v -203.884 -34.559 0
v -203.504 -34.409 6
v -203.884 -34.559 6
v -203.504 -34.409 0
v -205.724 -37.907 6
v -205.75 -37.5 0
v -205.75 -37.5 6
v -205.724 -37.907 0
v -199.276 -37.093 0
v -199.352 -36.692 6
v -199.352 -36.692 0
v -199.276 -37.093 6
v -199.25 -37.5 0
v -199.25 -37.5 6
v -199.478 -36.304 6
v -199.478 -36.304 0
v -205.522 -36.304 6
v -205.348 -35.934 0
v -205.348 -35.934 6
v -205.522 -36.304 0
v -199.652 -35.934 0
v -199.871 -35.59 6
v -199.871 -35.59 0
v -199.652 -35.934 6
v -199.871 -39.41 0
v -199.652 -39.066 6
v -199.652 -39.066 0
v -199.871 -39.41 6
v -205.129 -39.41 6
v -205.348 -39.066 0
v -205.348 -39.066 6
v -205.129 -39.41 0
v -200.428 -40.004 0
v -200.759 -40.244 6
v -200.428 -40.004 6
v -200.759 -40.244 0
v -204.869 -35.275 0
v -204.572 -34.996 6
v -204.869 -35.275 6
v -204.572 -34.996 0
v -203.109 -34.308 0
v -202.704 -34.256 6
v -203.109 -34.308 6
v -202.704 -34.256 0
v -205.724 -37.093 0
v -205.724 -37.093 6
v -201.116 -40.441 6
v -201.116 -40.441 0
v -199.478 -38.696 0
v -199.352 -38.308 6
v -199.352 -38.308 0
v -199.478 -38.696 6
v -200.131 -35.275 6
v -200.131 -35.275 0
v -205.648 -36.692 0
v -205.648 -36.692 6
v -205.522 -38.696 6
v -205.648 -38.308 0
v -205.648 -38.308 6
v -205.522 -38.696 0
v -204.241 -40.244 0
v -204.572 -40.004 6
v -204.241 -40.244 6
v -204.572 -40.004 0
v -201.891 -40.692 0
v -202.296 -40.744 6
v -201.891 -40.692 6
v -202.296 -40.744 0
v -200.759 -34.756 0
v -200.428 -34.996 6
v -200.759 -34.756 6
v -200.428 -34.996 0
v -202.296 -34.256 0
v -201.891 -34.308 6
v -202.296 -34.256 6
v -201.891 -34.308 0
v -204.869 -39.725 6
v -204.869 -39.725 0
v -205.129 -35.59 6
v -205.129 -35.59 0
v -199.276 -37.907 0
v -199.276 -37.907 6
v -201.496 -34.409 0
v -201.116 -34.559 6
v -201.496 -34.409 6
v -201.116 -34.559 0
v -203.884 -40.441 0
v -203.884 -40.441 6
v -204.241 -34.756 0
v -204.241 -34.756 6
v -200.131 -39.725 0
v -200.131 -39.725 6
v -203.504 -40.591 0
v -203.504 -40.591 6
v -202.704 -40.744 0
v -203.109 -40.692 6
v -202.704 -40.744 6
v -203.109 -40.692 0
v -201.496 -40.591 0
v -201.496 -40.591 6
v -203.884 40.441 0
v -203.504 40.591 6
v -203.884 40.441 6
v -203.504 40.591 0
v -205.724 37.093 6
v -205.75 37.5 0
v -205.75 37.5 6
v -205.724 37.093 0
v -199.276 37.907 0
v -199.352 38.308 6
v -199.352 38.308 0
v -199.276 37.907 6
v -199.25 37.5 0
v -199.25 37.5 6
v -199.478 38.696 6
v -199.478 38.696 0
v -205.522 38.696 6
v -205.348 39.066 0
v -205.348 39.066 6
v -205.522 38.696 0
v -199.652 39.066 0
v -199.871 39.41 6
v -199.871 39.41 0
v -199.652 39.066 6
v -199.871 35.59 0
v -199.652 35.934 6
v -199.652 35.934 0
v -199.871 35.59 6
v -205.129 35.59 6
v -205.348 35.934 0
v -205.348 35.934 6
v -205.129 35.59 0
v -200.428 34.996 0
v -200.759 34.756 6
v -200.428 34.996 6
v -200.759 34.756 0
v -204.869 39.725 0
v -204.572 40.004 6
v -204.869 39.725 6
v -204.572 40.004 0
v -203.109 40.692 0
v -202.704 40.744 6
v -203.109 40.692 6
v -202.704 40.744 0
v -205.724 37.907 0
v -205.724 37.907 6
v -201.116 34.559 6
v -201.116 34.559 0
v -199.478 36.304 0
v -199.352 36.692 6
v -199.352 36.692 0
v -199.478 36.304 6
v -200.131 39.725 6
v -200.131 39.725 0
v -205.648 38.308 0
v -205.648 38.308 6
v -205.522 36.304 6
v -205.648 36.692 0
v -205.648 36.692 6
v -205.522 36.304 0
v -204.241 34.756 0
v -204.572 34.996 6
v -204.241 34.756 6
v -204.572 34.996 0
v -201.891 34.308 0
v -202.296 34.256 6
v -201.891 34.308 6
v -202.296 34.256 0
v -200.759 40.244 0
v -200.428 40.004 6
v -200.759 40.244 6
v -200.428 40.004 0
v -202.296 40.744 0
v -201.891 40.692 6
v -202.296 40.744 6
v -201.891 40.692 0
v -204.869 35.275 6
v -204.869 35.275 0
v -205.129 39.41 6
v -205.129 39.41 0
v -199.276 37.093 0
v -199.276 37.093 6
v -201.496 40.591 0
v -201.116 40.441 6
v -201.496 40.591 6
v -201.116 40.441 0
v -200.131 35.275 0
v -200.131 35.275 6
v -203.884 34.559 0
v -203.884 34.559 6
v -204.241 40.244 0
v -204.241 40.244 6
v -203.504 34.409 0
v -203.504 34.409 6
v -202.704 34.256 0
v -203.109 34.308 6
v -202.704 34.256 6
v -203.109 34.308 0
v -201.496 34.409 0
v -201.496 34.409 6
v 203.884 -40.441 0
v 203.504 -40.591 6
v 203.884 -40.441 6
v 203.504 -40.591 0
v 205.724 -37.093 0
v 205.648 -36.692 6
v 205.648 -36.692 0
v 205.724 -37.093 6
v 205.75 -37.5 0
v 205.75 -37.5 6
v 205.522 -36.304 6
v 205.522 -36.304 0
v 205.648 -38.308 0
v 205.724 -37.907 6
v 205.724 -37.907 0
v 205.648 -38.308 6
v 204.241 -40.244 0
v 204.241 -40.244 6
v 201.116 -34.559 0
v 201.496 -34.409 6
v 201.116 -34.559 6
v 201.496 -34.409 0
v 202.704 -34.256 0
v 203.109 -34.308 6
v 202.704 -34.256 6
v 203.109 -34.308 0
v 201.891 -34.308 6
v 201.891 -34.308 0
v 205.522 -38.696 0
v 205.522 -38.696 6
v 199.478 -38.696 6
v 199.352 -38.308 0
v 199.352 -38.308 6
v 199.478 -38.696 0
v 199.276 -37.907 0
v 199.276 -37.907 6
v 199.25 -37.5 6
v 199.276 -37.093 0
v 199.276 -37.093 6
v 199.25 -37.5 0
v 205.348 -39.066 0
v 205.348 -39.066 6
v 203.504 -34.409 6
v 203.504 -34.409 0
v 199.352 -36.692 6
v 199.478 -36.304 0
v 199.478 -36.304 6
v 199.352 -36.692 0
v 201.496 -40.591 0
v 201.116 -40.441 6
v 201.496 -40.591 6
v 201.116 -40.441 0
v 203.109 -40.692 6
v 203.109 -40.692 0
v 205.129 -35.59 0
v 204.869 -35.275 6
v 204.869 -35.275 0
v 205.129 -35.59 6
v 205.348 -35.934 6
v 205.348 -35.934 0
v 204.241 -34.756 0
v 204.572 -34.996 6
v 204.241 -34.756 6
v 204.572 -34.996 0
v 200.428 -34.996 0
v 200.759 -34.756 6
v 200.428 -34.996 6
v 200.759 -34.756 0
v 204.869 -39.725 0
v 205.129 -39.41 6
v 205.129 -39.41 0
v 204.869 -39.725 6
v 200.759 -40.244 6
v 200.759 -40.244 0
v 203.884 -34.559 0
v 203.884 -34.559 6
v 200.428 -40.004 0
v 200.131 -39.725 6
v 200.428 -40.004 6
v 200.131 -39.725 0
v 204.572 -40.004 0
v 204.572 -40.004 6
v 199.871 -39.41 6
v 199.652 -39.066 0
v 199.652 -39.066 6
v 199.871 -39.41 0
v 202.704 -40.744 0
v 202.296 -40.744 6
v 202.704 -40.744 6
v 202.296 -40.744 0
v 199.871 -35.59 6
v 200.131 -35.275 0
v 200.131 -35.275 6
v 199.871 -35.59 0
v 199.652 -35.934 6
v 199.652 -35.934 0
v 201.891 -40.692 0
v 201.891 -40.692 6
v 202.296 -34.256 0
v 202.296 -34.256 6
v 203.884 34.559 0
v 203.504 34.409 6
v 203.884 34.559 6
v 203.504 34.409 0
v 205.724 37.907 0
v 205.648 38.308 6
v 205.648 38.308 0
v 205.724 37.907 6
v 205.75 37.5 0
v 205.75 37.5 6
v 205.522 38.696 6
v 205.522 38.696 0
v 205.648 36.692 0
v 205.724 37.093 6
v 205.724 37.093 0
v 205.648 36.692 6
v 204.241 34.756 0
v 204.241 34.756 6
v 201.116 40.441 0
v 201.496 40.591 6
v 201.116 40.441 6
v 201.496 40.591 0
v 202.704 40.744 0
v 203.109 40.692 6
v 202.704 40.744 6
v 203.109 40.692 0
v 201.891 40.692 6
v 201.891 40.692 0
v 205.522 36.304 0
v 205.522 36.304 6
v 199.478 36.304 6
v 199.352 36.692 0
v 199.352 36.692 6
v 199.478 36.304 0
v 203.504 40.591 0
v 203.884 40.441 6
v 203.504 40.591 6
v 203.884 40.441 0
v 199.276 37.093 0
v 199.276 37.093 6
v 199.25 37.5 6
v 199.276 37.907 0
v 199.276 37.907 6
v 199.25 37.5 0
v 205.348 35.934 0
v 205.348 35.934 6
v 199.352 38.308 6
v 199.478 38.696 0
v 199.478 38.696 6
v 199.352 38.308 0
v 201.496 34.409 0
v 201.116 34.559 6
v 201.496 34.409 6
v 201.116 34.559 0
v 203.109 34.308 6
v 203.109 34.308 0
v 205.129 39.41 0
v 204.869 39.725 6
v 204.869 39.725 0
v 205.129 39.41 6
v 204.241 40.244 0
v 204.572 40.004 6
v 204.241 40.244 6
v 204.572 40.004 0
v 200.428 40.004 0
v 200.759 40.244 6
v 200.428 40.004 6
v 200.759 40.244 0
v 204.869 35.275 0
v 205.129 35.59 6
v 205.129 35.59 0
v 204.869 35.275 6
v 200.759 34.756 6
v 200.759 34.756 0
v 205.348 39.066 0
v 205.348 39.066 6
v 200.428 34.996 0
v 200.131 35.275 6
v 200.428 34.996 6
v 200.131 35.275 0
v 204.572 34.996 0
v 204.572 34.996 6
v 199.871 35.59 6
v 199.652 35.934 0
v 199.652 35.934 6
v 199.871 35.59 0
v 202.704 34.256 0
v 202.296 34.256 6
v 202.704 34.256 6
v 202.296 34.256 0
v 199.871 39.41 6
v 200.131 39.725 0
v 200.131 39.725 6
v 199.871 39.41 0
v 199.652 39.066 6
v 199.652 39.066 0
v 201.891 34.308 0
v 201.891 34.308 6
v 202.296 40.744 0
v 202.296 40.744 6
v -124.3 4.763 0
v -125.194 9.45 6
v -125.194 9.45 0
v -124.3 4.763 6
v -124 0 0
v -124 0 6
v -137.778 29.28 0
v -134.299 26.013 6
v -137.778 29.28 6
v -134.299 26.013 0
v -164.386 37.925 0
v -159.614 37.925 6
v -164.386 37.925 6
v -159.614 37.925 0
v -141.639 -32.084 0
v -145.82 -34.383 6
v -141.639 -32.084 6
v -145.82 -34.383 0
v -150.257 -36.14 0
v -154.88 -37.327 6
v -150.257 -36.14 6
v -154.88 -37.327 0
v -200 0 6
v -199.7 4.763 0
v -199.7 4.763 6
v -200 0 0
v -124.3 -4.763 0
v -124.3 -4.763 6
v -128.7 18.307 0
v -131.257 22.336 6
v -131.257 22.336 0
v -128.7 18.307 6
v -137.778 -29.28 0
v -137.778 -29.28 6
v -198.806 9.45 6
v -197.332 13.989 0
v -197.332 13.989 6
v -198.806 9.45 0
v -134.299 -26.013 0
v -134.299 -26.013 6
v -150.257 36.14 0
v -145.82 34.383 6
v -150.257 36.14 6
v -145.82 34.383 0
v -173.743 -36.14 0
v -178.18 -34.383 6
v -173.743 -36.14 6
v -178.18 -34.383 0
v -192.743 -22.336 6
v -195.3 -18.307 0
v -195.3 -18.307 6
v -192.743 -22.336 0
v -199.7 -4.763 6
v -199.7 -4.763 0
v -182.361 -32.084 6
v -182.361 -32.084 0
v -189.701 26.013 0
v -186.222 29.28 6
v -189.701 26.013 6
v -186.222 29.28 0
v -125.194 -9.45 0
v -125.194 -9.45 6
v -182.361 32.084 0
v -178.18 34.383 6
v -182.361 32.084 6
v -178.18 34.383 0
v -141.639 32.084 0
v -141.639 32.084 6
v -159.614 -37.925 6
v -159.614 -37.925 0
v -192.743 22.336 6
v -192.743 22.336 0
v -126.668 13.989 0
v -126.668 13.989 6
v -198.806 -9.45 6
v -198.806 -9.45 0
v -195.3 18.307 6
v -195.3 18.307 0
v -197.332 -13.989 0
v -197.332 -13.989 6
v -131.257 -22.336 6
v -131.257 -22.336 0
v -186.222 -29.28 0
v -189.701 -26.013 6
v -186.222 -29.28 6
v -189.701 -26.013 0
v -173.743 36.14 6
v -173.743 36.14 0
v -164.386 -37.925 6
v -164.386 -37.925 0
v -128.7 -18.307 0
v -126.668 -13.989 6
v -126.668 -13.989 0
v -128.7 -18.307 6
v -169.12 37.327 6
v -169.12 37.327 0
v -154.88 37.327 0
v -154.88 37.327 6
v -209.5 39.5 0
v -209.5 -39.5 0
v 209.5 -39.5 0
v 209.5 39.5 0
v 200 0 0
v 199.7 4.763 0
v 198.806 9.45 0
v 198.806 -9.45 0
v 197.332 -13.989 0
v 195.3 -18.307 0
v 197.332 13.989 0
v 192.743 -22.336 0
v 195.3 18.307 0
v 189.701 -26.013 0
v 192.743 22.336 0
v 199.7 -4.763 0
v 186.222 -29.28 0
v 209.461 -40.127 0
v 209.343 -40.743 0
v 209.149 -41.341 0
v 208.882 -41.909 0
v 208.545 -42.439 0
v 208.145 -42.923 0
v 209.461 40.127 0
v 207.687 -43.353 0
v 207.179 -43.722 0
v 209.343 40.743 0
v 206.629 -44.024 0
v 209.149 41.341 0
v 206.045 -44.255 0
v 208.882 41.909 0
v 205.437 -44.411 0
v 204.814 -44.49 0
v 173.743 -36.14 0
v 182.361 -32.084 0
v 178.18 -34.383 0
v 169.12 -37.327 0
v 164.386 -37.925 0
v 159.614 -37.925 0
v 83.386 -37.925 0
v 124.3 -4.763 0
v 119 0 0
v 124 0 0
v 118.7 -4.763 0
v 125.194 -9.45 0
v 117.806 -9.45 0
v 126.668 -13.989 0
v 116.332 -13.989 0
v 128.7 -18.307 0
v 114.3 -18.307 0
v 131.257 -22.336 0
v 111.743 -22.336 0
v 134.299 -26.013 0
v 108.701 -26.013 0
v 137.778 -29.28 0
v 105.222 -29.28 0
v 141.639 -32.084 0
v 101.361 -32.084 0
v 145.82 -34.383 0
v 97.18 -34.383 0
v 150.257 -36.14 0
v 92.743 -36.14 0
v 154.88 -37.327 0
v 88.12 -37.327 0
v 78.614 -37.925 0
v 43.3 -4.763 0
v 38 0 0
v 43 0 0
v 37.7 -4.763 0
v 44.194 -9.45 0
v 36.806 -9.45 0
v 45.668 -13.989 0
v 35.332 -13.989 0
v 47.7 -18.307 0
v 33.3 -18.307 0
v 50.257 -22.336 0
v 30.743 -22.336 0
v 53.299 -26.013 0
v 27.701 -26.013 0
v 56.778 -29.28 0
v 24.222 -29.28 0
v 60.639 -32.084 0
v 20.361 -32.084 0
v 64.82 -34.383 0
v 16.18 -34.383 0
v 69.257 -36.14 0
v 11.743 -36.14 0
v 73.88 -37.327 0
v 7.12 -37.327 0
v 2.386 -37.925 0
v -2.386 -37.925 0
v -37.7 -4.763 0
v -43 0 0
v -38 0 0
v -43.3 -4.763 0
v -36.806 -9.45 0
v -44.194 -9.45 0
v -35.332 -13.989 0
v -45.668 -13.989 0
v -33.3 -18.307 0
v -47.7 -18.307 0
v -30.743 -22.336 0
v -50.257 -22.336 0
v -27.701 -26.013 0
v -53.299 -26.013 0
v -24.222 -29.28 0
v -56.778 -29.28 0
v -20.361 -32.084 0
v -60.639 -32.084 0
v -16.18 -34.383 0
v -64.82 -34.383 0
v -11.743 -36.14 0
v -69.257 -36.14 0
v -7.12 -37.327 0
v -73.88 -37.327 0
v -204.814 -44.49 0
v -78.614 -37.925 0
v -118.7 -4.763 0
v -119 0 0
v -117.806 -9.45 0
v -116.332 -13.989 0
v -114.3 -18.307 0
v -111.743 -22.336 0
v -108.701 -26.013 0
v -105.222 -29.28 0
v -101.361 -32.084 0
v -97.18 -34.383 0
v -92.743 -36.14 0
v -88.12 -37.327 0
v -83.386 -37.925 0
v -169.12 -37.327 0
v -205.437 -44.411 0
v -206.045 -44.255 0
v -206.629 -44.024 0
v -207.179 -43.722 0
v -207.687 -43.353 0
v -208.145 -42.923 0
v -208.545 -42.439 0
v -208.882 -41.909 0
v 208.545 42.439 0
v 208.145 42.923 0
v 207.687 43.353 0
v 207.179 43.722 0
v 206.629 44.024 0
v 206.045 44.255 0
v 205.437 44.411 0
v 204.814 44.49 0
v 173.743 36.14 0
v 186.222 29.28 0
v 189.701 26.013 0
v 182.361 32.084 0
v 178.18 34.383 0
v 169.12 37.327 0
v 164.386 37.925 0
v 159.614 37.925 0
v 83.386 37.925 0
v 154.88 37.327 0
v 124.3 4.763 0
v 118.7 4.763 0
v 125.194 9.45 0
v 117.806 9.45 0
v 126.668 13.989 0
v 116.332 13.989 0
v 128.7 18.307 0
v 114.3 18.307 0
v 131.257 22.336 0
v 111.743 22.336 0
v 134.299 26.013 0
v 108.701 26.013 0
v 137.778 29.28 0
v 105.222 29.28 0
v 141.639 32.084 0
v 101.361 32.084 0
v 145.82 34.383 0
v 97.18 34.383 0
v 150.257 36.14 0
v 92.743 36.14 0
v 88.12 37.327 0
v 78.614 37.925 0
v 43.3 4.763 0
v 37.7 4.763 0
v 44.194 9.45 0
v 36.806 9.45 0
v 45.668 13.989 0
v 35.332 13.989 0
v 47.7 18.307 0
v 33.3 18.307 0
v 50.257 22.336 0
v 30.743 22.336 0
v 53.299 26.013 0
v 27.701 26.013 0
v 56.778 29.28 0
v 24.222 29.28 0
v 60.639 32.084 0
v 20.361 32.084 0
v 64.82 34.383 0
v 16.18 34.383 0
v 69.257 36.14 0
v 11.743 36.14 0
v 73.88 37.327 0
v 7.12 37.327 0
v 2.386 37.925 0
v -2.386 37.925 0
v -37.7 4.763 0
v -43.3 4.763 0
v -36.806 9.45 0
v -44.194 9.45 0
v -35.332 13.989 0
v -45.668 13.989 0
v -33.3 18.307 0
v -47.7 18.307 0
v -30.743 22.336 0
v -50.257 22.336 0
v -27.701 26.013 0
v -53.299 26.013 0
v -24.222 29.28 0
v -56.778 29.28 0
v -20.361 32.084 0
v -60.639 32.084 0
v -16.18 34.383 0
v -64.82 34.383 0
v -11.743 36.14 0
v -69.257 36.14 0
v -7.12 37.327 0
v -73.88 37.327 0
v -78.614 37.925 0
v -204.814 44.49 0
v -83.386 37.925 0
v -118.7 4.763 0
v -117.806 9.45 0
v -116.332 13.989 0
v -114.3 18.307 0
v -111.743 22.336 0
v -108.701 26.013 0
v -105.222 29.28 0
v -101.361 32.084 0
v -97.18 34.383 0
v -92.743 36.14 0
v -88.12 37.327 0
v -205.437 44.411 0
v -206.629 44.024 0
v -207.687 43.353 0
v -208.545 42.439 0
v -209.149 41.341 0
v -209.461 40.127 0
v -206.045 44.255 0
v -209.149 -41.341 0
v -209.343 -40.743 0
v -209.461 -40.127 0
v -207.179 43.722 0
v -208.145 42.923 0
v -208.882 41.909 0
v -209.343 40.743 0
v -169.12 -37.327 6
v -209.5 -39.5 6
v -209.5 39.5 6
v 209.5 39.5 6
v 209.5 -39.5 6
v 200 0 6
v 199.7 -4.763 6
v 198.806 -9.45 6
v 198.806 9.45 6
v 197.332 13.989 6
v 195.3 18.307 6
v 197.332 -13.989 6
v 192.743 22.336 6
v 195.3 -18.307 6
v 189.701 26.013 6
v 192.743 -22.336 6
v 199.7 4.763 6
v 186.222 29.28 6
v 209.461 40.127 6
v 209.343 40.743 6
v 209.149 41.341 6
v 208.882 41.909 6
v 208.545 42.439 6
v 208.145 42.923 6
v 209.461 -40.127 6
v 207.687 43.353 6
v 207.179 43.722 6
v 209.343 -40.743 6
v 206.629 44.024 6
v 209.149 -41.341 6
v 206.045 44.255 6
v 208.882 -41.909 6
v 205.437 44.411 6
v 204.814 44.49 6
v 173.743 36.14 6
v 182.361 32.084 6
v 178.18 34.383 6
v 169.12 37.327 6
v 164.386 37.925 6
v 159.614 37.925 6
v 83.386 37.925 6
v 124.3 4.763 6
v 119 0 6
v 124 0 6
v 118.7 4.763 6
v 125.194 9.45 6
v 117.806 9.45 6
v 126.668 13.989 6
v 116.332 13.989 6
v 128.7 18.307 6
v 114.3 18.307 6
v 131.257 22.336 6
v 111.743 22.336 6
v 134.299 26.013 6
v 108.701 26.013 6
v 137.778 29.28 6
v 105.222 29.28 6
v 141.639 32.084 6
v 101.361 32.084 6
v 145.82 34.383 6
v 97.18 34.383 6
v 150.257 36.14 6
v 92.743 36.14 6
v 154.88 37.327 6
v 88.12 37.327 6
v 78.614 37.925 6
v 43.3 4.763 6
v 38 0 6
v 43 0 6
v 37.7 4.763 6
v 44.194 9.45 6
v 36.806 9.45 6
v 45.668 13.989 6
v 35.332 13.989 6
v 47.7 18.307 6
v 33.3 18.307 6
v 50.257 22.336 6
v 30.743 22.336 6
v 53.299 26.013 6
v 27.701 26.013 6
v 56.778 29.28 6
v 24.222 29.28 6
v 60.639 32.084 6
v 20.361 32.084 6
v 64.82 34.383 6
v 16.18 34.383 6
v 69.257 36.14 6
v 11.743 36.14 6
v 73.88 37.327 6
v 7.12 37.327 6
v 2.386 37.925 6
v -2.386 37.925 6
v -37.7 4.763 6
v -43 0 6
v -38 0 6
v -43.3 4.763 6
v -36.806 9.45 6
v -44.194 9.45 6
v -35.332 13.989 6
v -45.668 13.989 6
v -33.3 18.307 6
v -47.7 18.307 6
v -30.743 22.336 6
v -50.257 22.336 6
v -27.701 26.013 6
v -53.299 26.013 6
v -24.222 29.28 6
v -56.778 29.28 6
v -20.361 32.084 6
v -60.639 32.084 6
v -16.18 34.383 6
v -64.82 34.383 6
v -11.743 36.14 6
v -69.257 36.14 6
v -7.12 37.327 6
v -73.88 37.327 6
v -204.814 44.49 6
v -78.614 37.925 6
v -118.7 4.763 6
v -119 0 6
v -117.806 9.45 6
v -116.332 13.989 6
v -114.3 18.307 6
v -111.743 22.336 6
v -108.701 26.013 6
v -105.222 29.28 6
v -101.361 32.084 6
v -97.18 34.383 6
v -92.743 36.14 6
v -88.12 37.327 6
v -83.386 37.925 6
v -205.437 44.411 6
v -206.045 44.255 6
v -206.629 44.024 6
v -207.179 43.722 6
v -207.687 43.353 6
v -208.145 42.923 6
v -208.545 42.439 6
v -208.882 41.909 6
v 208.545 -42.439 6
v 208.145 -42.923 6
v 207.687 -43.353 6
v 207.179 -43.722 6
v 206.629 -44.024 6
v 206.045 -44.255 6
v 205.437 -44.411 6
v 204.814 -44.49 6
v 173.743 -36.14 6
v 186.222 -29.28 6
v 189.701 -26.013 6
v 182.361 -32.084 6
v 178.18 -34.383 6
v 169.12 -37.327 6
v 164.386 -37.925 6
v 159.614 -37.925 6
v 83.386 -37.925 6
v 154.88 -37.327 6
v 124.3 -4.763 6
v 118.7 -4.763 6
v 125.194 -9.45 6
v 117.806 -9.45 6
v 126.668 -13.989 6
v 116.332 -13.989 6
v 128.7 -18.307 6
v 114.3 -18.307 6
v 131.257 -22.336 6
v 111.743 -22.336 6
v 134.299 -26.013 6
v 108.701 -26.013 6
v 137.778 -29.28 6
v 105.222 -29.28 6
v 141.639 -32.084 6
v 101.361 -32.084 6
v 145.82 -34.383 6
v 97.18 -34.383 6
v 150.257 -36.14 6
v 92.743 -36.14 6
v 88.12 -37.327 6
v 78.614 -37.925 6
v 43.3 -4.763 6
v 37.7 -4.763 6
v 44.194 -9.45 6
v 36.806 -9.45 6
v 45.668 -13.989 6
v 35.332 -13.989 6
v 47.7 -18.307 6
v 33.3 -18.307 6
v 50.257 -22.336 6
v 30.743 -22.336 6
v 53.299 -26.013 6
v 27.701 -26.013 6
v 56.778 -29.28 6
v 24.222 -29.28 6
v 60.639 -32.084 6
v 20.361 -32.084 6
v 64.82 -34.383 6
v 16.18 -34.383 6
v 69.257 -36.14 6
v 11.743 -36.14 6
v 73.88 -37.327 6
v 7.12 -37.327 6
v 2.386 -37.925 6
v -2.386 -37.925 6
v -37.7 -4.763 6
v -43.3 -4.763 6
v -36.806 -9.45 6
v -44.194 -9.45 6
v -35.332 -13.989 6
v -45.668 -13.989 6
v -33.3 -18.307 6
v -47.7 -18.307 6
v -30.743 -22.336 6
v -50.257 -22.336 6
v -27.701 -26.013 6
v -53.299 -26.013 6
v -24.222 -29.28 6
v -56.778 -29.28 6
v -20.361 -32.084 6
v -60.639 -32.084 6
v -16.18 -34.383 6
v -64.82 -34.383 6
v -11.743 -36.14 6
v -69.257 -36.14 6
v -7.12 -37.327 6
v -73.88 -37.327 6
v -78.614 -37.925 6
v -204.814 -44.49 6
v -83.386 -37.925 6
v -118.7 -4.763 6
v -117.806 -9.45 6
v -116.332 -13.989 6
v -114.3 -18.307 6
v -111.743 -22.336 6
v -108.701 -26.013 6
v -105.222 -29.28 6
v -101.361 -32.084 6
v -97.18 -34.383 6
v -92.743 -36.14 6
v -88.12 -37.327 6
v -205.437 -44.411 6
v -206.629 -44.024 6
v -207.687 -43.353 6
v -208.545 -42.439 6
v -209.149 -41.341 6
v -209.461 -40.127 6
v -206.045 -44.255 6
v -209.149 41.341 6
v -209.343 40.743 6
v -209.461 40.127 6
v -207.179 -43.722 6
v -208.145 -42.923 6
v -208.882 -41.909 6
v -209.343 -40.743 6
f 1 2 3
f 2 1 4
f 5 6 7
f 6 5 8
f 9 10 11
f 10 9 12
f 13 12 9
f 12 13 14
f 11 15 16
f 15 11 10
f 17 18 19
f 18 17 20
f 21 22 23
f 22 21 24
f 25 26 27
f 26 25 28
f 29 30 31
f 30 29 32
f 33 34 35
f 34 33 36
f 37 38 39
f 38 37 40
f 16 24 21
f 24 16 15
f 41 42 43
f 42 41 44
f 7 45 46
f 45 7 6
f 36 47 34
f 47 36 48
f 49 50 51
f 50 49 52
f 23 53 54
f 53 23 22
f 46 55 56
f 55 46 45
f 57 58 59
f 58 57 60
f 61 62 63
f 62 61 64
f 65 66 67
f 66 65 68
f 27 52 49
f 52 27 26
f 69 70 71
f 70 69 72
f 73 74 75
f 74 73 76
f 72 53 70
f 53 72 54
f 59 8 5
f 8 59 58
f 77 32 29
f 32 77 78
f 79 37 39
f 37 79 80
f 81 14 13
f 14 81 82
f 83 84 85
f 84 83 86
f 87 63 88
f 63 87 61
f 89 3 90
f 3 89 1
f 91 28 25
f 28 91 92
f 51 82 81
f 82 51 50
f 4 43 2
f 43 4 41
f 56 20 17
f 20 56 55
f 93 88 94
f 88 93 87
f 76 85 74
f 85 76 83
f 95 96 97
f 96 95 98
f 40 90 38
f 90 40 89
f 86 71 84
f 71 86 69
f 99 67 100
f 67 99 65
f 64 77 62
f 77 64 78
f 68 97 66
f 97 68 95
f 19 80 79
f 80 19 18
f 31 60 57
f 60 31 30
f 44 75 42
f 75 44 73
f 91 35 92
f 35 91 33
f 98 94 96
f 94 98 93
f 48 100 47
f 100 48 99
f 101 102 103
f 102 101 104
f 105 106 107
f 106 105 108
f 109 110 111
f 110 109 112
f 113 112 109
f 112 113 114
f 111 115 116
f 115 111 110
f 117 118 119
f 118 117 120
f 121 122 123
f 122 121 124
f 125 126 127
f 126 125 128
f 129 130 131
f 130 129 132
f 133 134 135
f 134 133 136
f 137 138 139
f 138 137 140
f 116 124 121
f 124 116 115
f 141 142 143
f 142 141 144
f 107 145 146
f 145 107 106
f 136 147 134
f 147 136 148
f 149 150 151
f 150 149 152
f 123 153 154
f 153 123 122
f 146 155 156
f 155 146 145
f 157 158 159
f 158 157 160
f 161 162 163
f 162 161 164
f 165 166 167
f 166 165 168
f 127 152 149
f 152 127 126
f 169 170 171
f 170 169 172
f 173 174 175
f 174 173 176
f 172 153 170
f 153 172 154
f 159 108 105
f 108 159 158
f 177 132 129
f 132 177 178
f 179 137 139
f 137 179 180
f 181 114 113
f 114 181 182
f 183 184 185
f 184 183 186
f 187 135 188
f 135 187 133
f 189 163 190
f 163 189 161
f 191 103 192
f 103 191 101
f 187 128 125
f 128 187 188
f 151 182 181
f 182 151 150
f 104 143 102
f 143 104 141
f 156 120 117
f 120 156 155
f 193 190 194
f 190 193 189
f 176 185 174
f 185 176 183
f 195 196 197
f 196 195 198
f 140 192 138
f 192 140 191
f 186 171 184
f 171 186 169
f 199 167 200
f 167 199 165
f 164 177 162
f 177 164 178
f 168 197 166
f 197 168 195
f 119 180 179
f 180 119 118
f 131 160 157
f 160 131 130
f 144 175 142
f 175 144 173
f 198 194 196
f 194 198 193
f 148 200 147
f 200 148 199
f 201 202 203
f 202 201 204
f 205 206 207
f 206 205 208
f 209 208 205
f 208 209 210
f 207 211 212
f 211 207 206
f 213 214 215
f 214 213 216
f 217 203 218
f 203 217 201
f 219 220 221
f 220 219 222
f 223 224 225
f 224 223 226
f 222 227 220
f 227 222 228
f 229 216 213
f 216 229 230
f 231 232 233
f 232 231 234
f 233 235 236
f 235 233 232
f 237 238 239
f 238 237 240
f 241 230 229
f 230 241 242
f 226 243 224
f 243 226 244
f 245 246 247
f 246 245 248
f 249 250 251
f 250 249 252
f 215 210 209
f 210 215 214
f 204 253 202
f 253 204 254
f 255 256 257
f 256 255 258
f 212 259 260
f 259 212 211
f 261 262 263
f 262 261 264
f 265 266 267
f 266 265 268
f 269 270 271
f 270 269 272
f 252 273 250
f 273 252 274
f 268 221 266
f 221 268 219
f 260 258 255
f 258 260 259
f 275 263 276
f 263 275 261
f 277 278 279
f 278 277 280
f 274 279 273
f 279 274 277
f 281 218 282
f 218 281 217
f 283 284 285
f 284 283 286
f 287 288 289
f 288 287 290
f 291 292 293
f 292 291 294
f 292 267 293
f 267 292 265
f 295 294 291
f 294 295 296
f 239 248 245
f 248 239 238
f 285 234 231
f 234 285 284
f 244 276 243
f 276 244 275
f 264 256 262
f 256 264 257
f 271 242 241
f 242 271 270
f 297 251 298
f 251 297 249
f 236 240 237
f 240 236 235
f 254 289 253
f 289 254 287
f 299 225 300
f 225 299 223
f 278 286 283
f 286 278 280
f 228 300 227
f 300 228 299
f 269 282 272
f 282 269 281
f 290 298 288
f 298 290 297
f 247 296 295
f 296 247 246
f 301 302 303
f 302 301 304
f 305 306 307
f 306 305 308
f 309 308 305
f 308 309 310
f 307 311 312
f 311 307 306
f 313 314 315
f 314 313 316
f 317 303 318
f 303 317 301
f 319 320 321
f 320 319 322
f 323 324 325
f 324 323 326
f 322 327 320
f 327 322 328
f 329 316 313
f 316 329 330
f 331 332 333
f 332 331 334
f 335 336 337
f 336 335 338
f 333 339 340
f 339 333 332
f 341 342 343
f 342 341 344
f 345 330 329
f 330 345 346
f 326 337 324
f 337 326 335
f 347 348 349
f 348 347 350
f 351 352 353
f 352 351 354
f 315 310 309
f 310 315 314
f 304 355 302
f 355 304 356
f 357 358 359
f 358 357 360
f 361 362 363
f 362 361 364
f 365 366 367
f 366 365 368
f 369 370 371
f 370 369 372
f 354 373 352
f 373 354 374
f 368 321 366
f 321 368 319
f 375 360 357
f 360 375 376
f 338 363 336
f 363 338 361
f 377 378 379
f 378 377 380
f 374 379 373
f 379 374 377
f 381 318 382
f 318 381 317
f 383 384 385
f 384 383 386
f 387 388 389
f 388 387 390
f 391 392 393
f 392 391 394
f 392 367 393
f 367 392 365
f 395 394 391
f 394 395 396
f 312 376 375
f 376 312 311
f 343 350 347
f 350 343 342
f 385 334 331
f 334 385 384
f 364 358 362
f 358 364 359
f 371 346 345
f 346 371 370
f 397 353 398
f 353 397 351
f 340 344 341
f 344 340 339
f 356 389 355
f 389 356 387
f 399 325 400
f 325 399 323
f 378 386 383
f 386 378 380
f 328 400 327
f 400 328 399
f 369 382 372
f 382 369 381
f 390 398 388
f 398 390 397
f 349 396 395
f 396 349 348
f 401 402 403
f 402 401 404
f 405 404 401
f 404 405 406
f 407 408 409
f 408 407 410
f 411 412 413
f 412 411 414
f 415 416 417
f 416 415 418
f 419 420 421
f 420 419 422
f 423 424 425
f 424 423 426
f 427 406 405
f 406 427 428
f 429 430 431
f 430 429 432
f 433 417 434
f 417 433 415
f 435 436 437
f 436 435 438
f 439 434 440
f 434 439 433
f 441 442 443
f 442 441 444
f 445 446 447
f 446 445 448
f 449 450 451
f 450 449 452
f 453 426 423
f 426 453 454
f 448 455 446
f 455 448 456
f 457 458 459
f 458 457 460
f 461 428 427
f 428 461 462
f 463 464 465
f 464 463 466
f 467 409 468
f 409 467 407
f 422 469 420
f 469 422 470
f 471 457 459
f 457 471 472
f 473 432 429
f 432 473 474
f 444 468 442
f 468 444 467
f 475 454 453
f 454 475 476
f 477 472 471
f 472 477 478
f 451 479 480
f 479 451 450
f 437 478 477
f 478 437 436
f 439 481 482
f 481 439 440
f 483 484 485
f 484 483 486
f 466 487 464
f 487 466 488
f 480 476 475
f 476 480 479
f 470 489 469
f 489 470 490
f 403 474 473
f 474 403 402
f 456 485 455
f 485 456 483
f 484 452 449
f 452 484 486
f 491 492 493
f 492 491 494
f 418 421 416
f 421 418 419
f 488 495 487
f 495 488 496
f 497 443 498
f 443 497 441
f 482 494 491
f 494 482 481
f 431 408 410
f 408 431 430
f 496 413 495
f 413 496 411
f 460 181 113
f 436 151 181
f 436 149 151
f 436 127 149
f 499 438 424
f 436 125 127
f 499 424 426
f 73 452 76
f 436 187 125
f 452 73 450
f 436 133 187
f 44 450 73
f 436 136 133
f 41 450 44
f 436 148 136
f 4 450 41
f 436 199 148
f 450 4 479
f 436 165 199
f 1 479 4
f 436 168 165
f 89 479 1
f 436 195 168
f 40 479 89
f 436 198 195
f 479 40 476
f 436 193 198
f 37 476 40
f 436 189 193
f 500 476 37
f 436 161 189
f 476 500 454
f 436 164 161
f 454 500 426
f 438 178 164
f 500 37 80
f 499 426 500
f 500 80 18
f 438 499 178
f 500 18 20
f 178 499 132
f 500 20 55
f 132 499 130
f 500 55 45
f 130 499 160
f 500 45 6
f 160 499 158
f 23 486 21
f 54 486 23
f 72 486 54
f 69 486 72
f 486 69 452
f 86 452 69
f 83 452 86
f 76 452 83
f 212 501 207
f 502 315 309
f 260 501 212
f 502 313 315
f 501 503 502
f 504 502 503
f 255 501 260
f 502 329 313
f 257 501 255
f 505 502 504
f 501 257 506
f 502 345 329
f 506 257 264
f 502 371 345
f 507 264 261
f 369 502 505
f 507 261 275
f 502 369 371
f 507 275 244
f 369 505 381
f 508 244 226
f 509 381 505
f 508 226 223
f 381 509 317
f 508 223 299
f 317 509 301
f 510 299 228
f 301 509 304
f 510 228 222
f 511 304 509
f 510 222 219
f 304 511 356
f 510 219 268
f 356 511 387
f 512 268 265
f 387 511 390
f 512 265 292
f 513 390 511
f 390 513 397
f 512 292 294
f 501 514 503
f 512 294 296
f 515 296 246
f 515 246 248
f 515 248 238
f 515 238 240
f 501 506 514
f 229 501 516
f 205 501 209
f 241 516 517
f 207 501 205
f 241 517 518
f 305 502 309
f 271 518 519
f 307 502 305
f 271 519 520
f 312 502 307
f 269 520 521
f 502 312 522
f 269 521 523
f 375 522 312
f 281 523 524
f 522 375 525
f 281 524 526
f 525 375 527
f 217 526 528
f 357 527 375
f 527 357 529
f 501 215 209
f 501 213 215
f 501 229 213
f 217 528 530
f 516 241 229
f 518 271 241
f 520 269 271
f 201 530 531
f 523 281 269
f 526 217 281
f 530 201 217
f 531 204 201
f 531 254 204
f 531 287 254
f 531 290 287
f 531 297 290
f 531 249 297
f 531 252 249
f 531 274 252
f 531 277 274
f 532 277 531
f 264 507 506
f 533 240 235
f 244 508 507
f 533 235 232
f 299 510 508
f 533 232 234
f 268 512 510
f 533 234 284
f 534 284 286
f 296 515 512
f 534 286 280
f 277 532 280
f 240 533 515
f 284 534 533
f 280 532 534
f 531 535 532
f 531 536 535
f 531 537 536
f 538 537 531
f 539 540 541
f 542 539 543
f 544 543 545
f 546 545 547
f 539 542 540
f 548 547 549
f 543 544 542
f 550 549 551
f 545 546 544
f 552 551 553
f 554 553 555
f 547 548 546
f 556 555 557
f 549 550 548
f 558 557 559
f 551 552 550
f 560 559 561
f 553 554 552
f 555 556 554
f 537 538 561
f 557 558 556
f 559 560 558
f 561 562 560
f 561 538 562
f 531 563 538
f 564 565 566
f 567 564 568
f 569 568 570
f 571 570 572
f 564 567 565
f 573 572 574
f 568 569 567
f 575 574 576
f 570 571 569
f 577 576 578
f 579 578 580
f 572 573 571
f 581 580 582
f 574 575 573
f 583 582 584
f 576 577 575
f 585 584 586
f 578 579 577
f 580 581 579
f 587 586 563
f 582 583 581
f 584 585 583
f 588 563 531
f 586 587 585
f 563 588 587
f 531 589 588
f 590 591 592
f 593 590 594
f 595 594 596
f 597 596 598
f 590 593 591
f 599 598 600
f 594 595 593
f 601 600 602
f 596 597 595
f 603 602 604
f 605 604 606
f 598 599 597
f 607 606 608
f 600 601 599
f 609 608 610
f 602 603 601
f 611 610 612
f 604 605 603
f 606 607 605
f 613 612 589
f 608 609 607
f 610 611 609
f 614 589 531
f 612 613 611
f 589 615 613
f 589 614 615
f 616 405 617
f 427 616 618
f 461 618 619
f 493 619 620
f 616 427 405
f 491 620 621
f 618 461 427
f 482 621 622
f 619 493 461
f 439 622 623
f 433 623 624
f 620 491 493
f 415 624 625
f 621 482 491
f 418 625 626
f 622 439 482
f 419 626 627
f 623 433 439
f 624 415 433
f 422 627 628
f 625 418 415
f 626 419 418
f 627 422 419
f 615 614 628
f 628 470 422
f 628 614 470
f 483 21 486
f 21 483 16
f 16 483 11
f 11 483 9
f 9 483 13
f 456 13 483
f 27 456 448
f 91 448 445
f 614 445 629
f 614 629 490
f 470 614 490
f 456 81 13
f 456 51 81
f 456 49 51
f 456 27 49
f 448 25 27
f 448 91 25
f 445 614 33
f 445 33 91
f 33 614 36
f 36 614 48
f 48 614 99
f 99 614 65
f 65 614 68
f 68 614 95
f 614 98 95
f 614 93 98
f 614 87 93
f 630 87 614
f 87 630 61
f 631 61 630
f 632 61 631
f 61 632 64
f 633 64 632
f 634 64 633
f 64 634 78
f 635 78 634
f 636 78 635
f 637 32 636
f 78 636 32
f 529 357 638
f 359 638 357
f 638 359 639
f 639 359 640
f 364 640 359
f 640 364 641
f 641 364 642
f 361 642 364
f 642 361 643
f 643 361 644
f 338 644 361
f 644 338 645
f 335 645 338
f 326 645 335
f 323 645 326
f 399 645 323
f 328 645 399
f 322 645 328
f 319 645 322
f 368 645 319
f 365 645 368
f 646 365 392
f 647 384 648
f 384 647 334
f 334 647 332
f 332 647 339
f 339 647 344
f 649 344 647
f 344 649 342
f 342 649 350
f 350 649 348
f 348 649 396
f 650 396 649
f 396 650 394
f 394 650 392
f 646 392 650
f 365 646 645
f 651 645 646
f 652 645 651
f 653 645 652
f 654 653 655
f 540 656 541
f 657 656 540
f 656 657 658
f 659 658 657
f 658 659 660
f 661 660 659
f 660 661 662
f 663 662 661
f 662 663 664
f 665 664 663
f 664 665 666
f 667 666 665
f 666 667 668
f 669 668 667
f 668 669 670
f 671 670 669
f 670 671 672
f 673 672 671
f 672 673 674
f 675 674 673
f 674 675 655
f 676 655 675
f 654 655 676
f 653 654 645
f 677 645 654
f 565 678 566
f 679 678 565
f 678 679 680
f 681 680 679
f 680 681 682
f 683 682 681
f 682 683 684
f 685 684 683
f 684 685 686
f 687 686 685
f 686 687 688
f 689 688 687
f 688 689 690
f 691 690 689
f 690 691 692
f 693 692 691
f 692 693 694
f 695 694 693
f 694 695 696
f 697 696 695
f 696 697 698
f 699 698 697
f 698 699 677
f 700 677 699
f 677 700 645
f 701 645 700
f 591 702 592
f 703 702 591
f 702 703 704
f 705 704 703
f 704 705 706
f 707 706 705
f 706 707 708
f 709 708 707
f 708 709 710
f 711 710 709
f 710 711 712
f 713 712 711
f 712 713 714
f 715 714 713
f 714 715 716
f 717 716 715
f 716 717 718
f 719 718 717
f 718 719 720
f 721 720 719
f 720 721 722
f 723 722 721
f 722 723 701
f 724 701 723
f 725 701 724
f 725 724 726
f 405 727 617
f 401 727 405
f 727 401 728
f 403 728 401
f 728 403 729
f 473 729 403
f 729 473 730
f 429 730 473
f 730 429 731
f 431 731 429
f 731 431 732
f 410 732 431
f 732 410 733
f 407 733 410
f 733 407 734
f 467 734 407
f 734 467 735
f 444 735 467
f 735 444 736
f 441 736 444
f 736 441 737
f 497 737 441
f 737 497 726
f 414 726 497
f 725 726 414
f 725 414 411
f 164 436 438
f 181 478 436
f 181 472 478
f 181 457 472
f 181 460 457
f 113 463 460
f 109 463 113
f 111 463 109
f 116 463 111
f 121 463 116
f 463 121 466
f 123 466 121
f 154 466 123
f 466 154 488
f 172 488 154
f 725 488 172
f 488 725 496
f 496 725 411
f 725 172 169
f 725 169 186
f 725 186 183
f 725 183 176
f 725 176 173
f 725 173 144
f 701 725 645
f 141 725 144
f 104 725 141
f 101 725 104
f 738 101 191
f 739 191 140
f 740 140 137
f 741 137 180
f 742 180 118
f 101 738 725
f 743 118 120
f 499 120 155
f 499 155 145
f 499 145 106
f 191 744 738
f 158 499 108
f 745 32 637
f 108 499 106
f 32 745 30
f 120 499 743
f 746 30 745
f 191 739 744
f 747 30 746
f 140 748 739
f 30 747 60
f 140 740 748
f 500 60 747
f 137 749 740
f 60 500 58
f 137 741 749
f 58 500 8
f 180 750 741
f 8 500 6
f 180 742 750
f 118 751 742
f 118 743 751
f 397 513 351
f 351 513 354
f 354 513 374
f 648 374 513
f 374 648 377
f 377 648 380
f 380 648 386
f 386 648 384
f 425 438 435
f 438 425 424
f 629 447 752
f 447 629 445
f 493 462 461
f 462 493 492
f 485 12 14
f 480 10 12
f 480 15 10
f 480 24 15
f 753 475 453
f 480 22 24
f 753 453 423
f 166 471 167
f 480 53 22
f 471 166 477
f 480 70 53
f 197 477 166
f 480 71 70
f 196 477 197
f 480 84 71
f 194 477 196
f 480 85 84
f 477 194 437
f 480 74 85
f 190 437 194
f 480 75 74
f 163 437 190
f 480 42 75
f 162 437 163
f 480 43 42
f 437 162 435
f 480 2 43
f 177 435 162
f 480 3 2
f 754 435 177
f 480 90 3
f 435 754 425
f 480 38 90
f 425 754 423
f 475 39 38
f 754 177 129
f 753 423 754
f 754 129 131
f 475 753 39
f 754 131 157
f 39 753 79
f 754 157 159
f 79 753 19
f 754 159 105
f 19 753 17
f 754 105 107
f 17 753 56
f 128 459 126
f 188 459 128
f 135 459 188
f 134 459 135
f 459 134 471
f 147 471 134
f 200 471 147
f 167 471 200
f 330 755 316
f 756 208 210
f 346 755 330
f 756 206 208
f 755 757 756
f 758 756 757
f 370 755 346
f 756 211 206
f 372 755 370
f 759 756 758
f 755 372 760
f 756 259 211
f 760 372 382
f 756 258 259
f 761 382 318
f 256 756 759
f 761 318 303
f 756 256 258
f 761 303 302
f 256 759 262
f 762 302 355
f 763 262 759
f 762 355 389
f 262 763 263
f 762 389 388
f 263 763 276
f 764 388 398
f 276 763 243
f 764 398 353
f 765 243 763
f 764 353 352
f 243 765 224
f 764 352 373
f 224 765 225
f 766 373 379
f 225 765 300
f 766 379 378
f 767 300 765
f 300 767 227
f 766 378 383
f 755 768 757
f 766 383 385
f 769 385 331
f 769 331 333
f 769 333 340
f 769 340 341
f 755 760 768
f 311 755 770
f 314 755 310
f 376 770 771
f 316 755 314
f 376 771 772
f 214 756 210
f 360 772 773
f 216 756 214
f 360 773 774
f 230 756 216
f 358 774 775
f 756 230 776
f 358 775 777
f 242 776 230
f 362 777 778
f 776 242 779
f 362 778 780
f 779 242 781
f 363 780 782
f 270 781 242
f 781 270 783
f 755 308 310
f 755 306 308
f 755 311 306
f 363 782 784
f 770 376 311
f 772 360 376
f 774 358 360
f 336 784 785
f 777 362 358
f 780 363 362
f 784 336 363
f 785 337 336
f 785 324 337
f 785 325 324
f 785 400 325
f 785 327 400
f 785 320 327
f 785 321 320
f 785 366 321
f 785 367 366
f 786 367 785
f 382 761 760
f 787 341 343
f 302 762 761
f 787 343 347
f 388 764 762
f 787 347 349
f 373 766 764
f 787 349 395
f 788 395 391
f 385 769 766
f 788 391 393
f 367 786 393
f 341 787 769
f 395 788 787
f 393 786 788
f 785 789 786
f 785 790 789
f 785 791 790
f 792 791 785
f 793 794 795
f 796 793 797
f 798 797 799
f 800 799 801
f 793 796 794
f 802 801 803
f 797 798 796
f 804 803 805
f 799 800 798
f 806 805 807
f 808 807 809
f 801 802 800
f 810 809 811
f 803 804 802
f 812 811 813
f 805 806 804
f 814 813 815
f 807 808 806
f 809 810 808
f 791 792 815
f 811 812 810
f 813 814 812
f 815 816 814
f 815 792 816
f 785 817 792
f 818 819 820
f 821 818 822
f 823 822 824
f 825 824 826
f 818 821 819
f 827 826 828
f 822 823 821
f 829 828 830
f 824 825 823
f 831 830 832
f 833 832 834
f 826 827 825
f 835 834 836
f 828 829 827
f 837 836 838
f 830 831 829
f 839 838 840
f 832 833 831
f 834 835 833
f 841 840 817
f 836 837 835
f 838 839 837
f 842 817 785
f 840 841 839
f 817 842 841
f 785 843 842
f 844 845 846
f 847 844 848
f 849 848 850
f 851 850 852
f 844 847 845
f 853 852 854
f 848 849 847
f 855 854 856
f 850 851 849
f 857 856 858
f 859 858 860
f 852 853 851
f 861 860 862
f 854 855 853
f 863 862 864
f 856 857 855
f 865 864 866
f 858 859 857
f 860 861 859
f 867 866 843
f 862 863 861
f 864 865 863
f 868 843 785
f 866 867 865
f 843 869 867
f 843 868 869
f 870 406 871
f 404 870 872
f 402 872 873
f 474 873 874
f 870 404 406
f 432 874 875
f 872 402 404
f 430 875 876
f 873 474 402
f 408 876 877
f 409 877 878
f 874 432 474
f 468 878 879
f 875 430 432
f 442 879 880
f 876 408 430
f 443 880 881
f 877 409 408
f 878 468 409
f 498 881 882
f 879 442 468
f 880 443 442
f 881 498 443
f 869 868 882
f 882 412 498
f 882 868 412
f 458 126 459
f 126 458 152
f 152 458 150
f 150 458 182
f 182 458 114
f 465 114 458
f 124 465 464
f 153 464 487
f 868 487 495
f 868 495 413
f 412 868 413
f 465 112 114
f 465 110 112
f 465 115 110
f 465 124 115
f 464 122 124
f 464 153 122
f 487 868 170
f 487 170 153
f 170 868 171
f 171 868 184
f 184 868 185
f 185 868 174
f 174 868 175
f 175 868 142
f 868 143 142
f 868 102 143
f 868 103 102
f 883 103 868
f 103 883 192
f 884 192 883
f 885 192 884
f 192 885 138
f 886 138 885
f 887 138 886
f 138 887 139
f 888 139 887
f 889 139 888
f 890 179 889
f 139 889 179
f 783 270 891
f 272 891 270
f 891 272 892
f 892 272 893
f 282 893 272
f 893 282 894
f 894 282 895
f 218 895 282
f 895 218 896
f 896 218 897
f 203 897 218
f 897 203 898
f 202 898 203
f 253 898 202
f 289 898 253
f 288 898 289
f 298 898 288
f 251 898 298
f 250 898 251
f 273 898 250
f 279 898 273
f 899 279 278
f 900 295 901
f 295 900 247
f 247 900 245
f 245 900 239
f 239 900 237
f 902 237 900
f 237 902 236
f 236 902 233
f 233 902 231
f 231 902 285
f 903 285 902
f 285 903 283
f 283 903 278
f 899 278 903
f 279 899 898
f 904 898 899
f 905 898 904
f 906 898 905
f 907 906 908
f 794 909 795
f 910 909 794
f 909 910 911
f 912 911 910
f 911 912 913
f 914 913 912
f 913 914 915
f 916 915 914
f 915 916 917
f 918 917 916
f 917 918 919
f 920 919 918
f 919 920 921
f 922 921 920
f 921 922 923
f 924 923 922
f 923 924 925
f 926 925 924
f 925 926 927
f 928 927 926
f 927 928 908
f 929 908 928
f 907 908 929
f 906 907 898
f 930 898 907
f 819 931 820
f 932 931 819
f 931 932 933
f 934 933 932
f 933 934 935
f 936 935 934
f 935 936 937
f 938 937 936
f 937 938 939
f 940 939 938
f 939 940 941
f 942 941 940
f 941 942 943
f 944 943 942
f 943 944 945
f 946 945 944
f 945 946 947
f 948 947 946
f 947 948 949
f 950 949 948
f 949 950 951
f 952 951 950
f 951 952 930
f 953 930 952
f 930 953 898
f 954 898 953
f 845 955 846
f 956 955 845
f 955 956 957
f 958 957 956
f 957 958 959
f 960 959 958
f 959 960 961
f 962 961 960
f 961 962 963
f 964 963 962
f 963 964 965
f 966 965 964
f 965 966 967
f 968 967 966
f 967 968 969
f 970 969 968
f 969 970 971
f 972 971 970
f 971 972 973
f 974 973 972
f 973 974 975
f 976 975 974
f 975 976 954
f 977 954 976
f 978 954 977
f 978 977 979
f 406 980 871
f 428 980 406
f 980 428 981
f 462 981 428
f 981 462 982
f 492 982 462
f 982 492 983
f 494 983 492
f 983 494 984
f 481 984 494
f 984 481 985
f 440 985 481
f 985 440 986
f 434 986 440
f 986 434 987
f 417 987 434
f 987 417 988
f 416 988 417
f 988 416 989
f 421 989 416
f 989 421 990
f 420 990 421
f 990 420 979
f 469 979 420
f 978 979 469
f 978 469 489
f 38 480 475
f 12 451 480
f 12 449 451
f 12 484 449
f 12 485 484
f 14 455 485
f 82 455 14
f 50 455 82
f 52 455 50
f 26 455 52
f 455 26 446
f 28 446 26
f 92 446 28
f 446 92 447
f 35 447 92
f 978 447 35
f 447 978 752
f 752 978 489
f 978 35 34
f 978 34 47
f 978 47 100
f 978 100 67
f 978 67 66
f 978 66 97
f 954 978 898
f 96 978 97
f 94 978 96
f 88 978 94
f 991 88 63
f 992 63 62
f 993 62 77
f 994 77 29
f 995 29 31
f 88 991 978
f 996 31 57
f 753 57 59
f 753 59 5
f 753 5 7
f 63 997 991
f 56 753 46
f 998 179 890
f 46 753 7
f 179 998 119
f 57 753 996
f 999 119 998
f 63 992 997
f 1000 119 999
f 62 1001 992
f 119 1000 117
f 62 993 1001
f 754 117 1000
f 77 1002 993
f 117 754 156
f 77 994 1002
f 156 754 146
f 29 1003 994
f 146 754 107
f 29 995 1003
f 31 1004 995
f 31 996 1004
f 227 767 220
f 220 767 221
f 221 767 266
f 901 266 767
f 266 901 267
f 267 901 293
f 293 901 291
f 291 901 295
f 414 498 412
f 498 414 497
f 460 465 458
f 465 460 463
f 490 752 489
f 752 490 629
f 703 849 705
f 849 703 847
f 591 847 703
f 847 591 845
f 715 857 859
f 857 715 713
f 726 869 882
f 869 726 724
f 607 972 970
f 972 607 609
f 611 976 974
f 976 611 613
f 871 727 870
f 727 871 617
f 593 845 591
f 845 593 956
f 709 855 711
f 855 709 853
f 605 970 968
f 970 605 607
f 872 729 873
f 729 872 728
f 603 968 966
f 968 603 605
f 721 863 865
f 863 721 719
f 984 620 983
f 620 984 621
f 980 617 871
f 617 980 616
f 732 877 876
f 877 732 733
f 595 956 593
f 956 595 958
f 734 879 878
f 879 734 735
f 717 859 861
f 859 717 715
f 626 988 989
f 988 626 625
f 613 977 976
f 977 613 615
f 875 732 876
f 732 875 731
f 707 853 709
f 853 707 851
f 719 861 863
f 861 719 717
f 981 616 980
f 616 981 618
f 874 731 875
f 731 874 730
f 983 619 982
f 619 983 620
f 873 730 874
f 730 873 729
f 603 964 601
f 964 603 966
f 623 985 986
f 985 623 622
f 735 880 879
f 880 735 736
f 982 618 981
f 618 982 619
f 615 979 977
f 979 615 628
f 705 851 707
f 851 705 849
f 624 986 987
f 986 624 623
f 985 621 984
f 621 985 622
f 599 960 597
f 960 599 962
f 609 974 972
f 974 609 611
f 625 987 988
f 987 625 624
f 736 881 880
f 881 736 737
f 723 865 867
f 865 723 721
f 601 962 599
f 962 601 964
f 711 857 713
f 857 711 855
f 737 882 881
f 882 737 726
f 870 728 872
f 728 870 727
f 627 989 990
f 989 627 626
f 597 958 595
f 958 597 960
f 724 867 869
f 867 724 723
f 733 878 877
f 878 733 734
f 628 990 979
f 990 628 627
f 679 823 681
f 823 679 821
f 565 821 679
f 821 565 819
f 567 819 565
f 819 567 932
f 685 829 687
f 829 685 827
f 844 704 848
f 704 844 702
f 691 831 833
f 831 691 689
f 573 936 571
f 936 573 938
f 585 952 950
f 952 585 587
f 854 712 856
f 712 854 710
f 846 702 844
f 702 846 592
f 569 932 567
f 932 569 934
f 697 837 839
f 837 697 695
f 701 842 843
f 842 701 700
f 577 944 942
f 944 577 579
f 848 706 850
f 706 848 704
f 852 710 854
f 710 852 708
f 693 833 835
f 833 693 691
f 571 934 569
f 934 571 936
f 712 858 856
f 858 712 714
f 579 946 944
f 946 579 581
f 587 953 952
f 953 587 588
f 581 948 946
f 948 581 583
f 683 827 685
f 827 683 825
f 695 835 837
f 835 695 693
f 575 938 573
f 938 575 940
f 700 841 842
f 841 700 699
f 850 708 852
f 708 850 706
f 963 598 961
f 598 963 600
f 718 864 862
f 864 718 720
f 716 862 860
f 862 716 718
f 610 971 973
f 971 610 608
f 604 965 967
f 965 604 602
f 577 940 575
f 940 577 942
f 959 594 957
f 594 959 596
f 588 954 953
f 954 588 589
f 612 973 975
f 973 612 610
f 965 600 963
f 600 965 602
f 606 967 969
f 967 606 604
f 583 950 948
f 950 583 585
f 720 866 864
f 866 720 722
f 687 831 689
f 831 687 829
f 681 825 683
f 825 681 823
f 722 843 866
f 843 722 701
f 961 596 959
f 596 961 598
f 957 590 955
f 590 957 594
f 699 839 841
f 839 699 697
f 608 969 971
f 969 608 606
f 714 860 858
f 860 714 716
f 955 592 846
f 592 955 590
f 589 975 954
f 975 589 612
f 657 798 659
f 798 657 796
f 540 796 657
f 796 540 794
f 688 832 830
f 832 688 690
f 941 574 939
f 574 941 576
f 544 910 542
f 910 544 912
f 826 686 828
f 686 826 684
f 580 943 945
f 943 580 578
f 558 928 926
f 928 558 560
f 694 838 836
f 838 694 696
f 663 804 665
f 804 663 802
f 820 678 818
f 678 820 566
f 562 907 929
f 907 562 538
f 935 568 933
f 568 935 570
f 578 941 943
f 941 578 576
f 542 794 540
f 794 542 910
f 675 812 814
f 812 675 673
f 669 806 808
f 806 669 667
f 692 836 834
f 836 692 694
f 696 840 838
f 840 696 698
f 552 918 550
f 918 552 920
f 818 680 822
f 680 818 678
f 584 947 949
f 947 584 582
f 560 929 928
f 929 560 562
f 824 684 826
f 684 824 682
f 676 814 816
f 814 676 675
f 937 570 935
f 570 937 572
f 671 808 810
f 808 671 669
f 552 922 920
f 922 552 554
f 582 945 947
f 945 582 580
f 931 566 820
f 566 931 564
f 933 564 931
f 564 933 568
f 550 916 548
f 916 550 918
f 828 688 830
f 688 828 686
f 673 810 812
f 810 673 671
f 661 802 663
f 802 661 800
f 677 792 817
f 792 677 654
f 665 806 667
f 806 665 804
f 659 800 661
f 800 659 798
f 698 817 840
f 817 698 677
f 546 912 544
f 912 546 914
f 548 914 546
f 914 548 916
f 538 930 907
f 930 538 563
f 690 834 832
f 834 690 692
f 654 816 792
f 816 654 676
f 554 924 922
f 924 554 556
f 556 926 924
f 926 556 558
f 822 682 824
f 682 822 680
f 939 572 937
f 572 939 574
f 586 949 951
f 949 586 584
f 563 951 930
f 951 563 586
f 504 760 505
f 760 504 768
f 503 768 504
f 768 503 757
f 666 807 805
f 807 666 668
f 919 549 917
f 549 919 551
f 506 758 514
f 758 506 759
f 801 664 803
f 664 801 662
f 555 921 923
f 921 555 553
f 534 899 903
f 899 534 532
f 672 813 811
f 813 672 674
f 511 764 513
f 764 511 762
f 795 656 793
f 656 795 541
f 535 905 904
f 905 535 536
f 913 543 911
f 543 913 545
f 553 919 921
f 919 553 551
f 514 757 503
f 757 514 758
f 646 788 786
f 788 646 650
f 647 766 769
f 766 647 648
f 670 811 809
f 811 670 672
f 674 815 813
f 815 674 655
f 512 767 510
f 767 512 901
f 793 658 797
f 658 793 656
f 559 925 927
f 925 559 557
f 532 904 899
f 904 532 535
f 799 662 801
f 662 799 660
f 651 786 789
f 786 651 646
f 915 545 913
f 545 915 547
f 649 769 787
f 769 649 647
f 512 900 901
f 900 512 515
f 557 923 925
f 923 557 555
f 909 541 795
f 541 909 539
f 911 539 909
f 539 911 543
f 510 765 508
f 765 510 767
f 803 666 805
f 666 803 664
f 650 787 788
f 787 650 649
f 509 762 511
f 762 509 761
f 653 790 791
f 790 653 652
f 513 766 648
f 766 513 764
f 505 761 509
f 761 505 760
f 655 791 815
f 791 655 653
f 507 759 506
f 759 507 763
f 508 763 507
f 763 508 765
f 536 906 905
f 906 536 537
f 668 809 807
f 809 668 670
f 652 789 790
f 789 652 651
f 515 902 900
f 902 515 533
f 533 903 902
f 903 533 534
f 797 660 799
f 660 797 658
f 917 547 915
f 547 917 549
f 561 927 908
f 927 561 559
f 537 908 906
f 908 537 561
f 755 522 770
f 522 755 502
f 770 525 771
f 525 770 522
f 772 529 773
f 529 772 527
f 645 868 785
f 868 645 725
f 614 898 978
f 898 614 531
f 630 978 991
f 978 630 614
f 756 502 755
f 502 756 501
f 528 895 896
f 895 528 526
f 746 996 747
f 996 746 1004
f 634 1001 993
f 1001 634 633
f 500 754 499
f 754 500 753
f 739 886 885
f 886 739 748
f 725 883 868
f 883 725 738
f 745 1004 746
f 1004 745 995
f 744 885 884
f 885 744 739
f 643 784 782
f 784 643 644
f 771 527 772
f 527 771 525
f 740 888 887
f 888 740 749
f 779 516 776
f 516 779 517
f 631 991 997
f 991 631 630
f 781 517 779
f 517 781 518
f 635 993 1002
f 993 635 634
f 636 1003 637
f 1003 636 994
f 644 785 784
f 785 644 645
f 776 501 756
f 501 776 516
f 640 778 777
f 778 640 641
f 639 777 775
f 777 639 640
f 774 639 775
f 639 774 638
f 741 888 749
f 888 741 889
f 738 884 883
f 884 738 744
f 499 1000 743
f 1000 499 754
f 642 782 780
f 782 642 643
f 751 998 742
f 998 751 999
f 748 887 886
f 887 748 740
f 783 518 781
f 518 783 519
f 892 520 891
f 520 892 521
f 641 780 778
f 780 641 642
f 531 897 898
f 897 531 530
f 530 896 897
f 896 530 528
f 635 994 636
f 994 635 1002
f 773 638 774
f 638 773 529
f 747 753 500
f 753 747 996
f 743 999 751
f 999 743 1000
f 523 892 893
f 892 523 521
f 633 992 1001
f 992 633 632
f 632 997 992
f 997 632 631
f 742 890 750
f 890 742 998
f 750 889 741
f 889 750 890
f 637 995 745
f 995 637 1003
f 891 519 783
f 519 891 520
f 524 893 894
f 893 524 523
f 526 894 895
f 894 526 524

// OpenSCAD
$fn = 50;

difference() {
	union() {
		hull() {
			translate(v = [-204.5, 39.5, 0]) {
				cylinder(h = 6, r = 5);
			}
			translate(v = [204.5, 39.5, 0]) {
				cylinder(h = 6, r = 5);
			}
			translate(v = [-204.5, -39.5, 0]) {
				cylinder(h = 6, r = 5);
			}
			translate(v = [204.5, -39.5, 0]) {
				cylinder(h = 6, r = 5);
			}
		}
	}
	union() {
		translate(v = [-202.5, -37.5, -100.0]) {
			cylinder(h = 200, r = 3.25);
		}
		translate(v = [-202.5, 37.5, -100.0]) {
			cylinder(h = 200, r = 3.25);
		}
		translate(v = [202.5, -37.5, -100.0]) {
			cylinder(h = 200, r = 3.25);
		}
		translate(v = [202.5, 37.5, -100.0]) {
			cylinder(h = 200, r = 3.25);
		}
		translate(v = [-202.5, -37.5, -100.0]) {
			cylinder(h = 200, r = 1.8);
		}
		translate(v = [-202.5, 37.5, -100.0]) {
			cylinder(h = 200, r = 1.8);
		}
		translate(v = [202.5, -37.5, -100.0]) {
			cylinder(h = 200, r = 1.8);
		}
		translate(v = [202.5, 37.5, -100.0]) {
			cylinder(h = 200, r = 1.8);
		}
		translate(v = [-162.0, 0, 0.0]) {
			cylinder(h = 6, r = 38.0);
		}
		translate(v = [-81.0, 0, 0.0]) {
			cylinder(h = 6, r = 38.0);
		}
		cylinder(h = 6, r = 38.0);
		translate(v = [81.0, 0, 0.0]) {
			cylinder(h = 6, r = 38.0);
		}
		translate(v = [162.0, 0, 0.0]) {
			cylinder(h = 6, r = 38.0);
		}
	}
}
